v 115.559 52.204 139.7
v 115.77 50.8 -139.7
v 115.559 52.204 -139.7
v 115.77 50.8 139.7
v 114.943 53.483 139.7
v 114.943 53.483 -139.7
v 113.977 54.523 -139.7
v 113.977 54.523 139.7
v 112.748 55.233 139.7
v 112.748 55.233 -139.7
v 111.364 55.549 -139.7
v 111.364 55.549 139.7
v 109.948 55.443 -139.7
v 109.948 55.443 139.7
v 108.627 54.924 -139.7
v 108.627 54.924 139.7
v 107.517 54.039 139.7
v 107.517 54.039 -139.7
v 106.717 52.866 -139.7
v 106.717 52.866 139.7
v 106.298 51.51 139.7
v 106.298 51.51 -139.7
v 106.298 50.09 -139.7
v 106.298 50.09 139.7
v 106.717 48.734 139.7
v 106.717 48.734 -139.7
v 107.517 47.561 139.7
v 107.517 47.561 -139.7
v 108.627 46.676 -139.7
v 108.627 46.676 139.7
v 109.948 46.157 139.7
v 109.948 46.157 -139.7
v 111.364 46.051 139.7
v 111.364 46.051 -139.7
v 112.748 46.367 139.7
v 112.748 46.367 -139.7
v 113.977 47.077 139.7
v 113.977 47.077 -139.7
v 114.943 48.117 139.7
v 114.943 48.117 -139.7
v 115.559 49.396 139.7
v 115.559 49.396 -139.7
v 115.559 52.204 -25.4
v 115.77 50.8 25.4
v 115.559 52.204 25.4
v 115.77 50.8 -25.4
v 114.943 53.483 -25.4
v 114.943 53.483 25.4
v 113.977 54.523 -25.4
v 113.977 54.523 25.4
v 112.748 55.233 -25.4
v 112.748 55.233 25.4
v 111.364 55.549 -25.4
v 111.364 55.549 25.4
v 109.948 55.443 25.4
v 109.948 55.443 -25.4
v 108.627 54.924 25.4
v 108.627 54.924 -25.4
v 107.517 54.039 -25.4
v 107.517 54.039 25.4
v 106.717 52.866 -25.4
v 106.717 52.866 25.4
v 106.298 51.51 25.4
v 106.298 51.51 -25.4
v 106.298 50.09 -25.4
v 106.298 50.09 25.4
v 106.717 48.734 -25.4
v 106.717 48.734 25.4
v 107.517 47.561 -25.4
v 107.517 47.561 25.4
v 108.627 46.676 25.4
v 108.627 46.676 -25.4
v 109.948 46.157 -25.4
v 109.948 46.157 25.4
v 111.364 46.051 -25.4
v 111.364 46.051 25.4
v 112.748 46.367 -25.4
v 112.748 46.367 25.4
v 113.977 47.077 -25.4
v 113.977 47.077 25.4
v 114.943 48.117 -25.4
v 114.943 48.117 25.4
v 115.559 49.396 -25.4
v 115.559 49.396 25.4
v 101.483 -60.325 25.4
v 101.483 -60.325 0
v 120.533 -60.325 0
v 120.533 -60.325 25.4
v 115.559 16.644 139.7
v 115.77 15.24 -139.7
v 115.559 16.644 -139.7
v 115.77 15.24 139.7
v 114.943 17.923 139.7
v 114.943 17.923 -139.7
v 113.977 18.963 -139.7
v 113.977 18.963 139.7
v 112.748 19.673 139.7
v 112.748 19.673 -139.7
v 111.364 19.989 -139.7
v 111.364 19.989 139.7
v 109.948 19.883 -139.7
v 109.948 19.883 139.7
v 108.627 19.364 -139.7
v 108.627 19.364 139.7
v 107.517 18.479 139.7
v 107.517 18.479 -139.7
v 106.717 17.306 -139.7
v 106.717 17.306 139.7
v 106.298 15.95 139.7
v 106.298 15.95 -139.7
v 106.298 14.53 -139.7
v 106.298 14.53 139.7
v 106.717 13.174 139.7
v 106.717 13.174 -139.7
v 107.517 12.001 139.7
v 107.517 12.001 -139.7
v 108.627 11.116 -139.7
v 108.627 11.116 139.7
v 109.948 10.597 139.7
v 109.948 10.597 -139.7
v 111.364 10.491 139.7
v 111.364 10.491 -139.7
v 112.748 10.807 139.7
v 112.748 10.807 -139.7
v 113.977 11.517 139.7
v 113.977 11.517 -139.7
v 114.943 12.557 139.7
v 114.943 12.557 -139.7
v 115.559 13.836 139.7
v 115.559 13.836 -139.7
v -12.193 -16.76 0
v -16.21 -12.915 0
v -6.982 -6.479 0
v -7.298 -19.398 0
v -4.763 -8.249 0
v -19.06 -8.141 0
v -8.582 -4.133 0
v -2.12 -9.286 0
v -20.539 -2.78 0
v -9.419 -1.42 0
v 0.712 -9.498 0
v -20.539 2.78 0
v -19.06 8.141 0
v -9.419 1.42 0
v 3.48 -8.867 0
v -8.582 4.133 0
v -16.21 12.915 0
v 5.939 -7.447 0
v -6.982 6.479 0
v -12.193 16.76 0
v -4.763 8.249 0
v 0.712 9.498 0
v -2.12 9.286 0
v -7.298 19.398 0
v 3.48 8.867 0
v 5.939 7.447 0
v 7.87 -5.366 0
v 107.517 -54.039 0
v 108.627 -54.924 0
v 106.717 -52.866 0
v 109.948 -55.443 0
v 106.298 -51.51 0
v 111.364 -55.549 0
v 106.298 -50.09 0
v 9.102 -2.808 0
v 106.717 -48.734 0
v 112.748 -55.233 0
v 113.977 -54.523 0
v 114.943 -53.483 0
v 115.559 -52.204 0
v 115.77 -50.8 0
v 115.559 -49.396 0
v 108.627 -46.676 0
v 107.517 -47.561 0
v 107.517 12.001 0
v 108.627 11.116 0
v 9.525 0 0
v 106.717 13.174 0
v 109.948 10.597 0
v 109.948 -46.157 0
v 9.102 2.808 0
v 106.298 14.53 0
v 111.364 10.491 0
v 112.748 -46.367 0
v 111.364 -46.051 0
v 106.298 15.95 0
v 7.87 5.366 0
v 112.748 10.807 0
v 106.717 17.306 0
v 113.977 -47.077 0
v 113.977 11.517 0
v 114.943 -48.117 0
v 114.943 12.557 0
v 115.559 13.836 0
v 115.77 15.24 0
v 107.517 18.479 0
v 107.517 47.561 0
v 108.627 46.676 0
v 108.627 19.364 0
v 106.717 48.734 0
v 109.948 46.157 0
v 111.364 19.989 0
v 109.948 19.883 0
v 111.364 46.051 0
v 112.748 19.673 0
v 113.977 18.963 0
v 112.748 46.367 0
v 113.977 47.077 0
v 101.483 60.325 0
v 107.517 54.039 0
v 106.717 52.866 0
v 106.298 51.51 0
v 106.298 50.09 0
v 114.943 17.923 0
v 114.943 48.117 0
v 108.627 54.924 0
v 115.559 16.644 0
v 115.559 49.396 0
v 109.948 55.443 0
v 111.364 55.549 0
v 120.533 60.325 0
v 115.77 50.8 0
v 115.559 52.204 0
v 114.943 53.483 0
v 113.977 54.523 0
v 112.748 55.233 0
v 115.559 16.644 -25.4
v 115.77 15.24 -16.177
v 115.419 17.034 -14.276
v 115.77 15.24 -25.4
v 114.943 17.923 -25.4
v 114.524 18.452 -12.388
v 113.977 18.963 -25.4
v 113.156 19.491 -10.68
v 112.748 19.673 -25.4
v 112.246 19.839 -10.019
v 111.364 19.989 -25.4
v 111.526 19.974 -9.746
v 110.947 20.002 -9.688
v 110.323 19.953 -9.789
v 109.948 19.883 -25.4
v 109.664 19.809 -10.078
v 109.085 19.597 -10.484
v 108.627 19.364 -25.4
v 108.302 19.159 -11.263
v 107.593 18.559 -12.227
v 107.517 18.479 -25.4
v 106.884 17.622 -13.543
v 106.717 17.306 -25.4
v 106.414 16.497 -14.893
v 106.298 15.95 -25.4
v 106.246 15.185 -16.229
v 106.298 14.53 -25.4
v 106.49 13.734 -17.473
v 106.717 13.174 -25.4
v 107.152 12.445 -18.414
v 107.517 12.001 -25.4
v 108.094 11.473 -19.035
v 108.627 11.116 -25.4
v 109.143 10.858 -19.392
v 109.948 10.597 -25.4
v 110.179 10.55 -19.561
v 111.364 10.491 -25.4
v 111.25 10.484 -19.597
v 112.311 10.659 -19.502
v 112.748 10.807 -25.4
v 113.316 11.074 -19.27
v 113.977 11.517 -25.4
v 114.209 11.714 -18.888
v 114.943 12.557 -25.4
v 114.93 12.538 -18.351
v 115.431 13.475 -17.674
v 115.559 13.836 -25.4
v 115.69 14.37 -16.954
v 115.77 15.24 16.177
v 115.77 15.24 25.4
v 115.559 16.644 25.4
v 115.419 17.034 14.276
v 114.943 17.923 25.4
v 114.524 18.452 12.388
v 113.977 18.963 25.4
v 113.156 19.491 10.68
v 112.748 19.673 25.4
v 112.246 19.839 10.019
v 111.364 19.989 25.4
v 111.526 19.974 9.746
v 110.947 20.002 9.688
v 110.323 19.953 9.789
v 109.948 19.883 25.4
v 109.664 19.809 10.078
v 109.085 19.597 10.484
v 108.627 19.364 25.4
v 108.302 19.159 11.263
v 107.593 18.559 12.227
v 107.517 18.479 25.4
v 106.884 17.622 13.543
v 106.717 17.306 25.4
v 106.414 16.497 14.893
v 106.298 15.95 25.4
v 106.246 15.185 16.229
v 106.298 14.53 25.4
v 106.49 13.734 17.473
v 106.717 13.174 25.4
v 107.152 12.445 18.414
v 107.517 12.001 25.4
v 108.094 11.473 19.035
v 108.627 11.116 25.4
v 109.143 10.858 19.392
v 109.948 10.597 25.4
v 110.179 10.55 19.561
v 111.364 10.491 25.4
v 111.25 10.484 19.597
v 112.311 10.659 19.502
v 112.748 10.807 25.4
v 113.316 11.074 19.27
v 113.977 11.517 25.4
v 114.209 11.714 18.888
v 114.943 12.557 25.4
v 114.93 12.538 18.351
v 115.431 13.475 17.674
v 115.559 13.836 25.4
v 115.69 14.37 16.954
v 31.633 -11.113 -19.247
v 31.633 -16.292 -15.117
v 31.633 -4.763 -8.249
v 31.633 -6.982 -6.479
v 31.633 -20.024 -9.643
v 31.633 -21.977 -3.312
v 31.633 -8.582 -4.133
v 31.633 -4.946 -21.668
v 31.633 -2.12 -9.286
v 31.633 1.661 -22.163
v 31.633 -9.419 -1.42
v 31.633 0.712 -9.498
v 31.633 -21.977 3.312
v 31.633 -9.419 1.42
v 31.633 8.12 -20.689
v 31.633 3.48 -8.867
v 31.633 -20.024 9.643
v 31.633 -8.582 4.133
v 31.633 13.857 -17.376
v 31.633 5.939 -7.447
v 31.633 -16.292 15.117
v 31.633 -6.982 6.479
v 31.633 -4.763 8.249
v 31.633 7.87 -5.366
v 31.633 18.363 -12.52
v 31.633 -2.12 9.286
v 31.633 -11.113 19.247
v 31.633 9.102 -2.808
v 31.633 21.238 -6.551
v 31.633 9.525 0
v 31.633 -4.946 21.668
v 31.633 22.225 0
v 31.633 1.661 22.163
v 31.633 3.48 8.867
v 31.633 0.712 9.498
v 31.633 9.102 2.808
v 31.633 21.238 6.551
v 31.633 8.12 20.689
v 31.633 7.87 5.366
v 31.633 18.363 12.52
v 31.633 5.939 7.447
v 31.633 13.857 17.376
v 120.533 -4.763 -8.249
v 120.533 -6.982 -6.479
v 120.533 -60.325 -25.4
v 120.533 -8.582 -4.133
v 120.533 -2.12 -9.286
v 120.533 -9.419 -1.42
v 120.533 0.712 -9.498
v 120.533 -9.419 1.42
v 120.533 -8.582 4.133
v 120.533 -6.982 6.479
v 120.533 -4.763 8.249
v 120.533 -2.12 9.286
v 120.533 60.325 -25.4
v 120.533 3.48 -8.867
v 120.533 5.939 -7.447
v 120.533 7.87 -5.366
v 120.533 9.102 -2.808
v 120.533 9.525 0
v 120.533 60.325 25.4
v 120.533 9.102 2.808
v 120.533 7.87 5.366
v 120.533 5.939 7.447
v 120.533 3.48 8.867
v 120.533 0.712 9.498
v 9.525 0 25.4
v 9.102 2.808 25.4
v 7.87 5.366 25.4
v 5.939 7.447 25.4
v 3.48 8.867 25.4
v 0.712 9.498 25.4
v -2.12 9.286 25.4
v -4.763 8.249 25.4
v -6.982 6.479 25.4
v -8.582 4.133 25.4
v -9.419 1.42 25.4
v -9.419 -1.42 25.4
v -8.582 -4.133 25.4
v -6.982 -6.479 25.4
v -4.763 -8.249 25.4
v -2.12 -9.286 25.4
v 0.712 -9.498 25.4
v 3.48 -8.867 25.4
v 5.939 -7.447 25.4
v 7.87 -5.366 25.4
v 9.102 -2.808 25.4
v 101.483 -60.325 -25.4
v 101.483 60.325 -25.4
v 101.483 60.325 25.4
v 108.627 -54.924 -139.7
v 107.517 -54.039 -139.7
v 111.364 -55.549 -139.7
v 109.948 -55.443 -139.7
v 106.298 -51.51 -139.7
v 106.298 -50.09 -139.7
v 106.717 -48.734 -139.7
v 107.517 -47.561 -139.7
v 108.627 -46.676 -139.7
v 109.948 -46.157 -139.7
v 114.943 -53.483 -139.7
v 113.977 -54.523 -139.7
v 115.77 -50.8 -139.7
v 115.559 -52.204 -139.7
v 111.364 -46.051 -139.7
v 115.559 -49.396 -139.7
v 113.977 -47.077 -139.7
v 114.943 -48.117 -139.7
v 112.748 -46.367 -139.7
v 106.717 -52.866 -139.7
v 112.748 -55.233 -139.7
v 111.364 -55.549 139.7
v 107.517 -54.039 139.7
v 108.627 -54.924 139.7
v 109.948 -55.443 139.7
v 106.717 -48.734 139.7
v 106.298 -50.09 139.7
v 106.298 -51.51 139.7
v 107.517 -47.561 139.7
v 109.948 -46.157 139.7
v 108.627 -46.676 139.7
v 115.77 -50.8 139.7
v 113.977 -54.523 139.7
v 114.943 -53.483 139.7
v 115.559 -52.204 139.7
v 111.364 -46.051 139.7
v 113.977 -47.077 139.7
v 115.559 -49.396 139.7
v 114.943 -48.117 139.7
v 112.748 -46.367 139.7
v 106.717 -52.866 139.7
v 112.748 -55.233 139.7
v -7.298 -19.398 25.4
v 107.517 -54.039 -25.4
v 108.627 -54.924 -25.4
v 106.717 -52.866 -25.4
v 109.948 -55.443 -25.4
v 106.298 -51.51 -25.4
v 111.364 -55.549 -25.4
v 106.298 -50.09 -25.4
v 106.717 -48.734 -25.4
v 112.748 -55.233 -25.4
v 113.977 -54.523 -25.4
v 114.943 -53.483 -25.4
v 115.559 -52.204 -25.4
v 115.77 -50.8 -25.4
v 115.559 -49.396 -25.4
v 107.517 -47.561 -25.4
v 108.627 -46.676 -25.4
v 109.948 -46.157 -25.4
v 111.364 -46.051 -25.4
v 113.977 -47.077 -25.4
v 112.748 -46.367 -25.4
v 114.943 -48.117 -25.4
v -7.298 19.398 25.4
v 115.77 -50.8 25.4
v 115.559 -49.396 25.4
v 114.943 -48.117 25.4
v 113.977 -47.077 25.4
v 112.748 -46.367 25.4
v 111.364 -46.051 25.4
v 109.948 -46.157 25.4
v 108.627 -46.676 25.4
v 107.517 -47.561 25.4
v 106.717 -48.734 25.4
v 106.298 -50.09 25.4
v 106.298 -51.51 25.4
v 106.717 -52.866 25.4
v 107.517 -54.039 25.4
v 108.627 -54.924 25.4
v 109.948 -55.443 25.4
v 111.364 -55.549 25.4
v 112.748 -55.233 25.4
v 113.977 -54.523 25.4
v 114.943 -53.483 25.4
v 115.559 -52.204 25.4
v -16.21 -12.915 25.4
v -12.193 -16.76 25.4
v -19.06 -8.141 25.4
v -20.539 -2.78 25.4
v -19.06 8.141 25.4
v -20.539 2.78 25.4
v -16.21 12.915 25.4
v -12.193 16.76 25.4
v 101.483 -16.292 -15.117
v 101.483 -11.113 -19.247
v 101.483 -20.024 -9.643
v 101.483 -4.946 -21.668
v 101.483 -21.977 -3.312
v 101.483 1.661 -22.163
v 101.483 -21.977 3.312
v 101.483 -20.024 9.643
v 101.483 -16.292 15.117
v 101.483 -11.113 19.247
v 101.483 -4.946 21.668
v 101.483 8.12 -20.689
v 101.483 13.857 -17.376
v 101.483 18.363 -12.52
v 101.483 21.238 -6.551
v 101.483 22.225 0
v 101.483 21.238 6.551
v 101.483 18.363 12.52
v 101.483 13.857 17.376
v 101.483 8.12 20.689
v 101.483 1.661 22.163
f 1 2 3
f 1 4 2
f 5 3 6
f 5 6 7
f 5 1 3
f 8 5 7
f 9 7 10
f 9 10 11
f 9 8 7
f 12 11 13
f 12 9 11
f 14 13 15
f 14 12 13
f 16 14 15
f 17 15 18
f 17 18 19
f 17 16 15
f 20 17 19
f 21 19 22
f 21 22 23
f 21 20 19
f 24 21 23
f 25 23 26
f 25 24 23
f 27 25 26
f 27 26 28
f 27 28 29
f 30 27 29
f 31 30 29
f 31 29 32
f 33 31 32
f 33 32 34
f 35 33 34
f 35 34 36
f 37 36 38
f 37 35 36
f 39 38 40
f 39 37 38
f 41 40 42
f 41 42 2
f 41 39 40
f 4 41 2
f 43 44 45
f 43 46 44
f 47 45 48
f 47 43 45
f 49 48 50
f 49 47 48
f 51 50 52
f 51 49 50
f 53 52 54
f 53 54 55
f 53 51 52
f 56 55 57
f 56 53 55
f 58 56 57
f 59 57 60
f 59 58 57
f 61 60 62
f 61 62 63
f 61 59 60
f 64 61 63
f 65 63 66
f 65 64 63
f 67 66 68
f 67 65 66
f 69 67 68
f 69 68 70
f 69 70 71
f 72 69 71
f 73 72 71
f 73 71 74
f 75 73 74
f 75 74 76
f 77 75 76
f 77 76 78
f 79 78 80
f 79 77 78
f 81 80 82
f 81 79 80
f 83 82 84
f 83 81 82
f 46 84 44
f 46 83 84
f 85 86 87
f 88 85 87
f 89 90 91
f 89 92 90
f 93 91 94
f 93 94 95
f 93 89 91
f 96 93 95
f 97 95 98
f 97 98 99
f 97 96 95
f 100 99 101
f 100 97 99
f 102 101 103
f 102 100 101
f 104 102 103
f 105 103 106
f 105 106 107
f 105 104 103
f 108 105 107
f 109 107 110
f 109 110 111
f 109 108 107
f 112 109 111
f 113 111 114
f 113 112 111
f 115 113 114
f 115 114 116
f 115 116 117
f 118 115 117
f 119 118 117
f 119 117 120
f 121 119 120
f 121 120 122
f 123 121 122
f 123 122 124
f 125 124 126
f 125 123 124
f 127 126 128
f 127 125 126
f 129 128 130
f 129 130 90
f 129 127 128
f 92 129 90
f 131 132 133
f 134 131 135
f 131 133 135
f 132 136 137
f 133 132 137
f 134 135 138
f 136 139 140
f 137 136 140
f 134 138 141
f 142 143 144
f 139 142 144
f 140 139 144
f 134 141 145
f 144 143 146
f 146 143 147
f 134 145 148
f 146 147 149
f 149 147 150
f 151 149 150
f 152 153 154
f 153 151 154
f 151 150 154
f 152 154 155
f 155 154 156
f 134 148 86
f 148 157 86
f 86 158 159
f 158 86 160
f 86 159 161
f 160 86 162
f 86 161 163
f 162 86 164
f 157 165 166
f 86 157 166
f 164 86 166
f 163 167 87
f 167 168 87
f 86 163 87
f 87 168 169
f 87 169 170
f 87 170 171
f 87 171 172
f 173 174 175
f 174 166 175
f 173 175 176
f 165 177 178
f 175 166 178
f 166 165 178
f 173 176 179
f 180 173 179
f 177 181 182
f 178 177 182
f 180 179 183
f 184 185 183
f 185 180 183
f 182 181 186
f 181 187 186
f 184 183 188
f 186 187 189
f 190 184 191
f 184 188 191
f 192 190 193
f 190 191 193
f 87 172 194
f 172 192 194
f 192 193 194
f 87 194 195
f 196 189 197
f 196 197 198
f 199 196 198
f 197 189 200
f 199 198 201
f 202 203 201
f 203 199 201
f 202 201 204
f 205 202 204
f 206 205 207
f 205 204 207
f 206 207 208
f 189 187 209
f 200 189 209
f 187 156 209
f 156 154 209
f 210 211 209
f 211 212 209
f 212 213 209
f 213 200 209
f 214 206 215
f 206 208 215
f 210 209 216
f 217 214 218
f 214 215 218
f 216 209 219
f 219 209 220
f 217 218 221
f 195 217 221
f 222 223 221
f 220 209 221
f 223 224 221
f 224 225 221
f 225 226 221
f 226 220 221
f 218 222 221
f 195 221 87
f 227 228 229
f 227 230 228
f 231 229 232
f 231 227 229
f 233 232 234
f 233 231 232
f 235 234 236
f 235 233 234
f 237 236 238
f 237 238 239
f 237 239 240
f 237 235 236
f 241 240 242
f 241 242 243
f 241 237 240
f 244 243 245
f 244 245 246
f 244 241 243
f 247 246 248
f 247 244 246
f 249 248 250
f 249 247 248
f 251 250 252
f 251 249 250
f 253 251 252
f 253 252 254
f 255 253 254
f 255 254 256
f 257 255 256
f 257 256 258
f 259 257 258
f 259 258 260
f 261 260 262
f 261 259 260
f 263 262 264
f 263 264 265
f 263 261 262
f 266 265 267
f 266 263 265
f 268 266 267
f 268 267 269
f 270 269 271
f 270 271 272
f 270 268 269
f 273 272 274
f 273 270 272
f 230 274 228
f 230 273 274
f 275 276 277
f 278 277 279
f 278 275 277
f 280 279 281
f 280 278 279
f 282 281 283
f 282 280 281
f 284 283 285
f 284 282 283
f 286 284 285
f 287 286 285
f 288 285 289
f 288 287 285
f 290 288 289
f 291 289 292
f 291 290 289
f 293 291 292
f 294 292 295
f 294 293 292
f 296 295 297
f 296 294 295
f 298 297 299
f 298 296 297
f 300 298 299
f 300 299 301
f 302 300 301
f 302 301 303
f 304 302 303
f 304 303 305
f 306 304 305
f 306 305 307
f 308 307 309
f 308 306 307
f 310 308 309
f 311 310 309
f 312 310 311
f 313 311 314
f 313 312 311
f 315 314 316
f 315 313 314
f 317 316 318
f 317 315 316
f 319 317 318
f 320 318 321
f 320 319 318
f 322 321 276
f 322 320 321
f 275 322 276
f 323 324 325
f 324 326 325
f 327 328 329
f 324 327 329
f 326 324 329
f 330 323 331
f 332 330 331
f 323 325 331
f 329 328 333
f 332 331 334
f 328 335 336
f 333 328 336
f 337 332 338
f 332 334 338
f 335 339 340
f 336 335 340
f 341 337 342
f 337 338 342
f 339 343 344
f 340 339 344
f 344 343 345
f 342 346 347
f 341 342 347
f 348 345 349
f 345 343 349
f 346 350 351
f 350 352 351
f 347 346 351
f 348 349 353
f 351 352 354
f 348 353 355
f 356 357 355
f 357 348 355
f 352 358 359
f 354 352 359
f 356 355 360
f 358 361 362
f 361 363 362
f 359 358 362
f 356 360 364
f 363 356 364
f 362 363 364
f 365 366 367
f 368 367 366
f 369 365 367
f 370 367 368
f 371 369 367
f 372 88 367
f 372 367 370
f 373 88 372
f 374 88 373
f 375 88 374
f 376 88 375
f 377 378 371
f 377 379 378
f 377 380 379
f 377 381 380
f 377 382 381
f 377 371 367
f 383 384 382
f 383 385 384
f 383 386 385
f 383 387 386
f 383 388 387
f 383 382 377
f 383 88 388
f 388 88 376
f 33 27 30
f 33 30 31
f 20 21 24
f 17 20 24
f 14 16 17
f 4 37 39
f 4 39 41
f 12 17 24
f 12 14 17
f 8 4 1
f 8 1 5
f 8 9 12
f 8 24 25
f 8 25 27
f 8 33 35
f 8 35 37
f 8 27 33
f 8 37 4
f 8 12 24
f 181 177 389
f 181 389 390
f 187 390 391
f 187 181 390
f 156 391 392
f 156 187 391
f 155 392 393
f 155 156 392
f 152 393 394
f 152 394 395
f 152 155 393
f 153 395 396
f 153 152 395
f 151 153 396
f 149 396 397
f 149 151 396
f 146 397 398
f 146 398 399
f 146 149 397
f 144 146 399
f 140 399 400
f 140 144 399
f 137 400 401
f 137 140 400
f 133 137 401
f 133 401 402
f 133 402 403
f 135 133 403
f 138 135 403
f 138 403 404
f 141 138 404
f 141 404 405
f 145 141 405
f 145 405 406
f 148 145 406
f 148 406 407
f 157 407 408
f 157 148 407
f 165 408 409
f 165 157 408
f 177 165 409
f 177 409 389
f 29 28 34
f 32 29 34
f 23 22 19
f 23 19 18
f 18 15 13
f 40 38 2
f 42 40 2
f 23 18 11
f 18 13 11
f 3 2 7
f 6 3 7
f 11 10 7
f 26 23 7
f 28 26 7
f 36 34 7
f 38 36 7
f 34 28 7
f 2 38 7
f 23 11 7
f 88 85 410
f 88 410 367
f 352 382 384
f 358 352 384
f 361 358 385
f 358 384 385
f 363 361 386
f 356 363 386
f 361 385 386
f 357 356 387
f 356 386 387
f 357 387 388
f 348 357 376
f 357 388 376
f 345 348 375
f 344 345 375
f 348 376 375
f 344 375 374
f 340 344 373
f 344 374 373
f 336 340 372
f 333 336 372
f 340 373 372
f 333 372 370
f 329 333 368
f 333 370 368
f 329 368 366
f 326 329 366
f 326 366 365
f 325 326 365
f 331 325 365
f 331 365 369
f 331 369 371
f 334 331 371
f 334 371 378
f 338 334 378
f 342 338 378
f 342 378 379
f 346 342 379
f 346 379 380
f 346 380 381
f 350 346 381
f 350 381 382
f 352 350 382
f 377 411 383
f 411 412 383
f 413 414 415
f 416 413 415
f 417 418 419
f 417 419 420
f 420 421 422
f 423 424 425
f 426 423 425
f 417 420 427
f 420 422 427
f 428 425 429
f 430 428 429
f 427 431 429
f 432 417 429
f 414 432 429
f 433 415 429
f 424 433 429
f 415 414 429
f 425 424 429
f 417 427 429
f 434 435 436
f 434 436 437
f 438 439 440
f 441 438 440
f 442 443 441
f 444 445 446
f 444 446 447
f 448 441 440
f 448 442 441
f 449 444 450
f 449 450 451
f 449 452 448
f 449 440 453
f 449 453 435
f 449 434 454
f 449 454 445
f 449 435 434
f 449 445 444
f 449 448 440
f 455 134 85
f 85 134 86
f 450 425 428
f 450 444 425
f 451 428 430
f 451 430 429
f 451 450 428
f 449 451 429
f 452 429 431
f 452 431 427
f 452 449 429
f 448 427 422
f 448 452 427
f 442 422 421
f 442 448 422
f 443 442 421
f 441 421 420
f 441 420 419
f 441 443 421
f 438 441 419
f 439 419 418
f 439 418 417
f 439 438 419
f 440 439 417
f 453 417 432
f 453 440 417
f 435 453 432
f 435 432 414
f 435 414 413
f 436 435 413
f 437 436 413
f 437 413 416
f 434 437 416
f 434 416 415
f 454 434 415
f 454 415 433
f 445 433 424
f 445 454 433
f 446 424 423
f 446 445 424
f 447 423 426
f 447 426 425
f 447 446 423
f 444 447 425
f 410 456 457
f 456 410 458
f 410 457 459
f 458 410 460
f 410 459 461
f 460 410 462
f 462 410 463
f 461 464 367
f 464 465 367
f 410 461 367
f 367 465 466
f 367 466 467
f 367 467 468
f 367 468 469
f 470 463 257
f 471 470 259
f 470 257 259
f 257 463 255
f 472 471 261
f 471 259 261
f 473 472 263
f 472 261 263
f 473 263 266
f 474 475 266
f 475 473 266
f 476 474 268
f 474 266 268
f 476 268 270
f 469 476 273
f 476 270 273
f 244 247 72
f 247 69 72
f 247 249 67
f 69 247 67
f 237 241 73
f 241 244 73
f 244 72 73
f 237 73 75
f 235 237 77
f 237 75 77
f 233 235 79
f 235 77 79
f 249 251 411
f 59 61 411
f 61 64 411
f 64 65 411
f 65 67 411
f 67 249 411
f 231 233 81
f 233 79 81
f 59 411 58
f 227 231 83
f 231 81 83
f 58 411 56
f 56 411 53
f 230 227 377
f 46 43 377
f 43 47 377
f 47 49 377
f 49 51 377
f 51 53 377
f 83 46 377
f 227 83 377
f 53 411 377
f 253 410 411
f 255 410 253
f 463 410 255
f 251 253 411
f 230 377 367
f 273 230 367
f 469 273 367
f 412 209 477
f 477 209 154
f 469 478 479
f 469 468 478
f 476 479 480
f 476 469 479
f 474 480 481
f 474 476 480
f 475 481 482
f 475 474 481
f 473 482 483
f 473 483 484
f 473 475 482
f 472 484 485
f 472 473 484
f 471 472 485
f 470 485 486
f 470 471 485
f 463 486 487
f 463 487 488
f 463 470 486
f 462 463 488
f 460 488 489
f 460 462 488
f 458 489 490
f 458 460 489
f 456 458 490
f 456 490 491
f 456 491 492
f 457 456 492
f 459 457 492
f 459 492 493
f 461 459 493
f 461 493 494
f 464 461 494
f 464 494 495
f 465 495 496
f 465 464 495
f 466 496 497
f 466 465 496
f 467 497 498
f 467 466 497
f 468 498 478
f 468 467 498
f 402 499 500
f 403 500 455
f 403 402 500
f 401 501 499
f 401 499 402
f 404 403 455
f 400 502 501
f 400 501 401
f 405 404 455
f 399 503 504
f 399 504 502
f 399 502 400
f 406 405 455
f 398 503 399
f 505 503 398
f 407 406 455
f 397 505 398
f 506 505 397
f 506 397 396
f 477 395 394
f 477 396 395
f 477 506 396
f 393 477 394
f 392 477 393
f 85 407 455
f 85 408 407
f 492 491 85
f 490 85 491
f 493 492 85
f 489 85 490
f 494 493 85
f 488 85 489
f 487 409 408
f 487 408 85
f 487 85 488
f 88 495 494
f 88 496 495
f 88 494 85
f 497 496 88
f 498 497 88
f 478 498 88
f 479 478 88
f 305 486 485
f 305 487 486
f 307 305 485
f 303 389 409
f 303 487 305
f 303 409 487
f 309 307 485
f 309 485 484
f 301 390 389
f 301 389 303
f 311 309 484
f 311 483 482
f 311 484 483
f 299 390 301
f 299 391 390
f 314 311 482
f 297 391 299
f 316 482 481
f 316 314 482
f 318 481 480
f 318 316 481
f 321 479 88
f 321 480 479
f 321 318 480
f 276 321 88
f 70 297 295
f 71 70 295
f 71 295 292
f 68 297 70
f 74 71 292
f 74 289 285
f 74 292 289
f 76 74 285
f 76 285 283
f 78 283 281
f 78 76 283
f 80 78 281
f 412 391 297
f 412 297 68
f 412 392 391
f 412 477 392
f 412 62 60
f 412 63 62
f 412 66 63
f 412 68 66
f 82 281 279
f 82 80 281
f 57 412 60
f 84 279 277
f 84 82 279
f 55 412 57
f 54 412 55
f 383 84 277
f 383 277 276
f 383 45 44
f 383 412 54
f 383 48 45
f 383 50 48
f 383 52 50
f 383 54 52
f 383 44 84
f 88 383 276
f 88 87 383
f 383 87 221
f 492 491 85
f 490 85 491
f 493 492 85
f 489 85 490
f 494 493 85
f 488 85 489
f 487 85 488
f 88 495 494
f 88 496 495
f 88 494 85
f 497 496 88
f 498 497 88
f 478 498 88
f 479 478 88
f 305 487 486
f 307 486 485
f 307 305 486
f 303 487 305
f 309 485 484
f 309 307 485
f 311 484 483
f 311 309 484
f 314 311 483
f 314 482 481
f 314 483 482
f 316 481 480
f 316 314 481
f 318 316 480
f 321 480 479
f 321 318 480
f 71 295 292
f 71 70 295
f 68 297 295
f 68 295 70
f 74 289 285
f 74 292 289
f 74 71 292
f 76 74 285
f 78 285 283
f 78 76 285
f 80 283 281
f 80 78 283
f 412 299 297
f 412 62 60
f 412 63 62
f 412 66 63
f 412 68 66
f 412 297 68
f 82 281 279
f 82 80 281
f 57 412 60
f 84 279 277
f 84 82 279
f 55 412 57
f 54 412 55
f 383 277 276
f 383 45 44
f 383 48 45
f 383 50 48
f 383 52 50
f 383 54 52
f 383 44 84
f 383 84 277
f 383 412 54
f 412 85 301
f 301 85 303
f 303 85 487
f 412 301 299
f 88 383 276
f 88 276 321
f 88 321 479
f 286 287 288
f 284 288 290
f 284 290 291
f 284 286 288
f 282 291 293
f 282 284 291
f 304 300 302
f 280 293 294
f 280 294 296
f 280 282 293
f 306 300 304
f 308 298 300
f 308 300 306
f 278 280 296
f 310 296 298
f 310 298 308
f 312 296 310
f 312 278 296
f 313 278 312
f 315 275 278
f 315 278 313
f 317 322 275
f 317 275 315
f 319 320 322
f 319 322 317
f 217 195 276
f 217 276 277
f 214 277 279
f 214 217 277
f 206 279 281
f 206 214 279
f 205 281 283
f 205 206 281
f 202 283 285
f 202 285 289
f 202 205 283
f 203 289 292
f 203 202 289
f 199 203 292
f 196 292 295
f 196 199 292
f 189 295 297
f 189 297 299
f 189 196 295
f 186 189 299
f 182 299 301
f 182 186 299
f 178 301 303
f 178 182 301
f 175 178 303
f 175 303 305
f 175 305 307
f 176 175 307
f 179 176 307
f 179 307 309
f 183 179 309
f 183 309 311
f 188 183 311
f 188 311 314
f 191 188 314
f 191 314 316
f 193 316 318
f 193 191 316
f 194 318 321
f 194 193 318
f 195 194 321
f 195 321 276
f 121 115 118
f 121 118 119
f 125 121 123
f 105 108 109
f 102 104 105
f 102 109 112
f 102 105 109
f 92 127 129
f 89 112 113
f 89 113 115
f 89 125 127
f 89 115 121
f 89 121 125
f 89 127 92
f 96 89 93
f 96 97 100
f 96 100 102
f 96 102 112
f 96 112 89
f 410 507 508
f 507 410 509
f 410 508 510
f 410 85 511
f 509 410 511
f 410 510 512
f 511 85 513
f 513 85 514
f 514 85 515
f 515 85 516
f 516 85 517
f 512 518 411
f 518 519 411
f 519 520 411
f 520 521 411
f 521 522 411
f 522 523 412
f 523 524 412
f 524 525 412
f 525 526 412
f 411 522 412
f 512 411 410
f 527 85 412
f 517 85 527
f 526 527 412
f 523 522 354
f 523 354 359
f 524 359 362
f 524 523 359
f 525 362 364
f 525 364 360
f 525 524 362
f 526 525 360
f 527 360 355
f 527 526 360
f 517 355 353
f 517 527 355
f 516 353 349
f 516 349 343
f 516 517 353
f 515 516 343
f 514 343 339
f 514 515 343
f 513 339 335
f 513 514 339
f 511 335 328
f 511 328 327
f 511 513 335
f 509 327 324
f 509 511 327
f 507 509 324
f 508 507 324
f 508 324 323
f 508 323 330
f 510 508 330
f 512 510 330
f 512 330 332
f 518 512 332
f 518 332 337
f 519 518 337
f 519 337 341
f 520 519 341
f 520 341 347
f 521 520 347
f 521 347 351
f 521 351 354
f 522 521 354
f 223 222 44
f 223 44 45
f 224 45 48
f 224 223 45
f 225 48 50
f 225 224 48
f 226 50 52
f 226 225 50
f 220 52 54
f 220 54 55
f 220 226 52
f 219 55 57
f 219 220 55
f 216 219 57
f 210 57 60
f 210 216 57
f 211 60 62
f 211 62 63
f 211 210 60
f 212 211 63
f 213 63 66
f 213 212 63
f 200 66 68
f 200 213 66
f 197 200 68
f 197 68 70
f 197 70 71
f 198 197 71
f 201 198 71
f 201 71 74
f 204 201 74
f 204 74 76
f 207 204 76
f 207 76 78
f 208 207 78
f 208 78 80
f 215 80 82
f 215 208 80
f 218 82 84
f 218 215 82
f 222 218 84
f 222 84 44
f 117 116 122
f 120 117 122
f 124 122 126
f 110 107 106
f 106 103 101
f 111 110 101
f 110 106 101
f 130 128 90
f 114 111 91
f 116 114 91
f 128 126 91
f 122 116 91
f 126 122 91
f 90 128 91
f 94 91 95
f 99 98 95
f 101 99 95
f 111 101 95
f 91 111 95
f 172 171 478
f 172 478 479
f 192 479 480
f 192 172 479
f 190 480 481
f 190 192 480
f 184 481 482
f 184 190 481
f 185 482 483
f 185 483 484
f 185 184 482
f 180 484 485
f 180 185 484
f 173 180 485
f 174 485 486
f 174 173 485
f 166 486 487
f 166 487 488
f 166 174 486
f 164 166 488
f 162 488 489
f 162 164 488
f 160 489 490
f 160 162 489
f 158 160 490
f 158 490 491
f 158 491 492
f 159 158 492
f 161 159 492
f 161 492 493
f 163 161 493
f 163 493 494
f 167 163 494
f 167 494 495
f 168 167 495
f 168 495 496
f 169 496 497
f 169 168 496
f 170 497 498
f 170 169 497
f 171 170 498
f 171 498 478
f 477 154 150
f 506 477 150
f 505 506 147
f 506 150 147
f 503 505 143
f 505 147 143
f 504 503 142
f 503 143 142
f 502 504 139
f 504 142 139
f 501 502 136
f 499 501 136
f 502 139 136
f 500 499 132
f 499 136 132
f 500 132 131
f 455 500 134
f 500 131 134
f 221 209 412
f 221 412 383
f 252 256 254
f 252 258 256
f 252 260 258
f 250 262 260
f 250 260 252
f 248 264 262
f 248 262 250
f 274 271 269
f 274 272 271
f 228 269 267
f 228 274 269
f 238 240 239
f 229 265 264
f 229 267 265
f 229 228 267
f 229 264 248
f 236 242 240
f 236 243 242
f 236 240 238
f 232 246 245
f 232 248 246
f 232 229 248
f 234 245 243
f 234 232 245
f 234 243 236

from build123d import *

# Parameters (mm, degrees)
F0_R     = 4.7625
F1_DEPTH = 139.7
F0_W     = 19.05
F0_H     = 120.65
F0_R_2   = 9.525
F2_DEPTH = 25.4
F3_DEPTH = 25.4
F4_R     = 22.225
F4_R_2   = 9.525
F5_DEPTH = 88.9
F6_DEPTH = 141.2596404097


with BuildPart() as f1:
    # F0 (on Top) → F1 (new body, symmetric)
    with BuildSketch(Plane.XY):
        with Locations((111.0077798367, 50.8)):
            Circle(F0_R)
    extrude(amount=F1_DEPTH, both=True)


with BuildPart() as f1b:
    # F0 (on Top) → F1, piece 2 (new body, symmetric)
    with BuildSketch(Plane.XY):
        with Locations((111.0077798367, 15.24)):
            Circle(F0_R)
    extrude(amount=F1_DEPTH, both=True)


with BuildPart() as f1c:
    # F0 (on Top) → F1, piece 3 (new body, symmetric)
    with BuildSketch(Plane.XY):
        with Locations((111.0077798367, -50.8)):
            Circle(F0_R)
    extrude(amount=F1_DEPTH, both=True)


with BuildPart() as f2:
    # F0 (on Top) → F2 (new body)
    with BuildSketch(Plane.XY):
        with Locations((111.0077798367, 0)):
            Rectangle(F0_W, F0_H)
        with Locations((111.0077798367, -50.8)):
            Circle(F0_R, mode=Mode.SUBTRACT)
        with Locations((111.0077798367, 15.24)):
            Circle(F0_R, mode=Mode.SUBTRACT)
        with Locations((111.0077798367, 50.8)):
            Circle(F0_R, mode=Mode.SUBTRACT)
        with BuildLine():
            Line((101.4827798367, -60.325), (101.4827798367, 60.325))
            Line((101.4827798367, 60.325), (-7.298240398, 19.3983757977))
            ThreePointArc((-7.298240398, 19.3983757977), (-20.7258605731, 0), (-7.298240398, -19.3983757977))
            Line((-7.298240398, -19.3983757977), (101.4827798367, -60.325))
        make_face()
        Circle(F0_R_2, mode=Mode.SUBTRACT)
    extrude(amount=F2_DEPTH)


with BuildPart() as f3:
    # F0 (on Top) → F3 (new body, symmetric)
    with BuildSketch(Plane.XY):
        with Locations((111.0077798367, 0)):
            Rectangle(F0_W, F0_H)
        with Locations((111.0077798367, -50.8)):
            Circle(F0_R, mode=Mode.SUBTRACT)
        with Locations((111.0077798367, 15.24)):
            Circle(F0_R, mode=Mode.SUBTRACT)
        with Locations((111.0077798367, 50.8)):
            Circle(F0_R, mode=Mode.SUBTRACT)
    extrude(amount=F3_DEPTH, both=True)

    # F4 (on face) → F5 (join)
    with BuildSketch(Plane.YZ.offset(120.5327798367)):
        Circle(F4_R)
        Circle(F4_R_2, mode=Mode.SUBTRACT)
    extrude(amount=-F5_DEPTH)

    # F4 (on face) → F6 (cut, through all)
    with BuildSketch(Plane.YZ.offset(120.5327798367)):
        Circle(F4_R_2)
    extrude(amount=-F6_DEPTH, mode=Mode.SUBTRACT)


solid = Compound([f1.part, f1b.part, f1c.part, f2.part, f3.part])
